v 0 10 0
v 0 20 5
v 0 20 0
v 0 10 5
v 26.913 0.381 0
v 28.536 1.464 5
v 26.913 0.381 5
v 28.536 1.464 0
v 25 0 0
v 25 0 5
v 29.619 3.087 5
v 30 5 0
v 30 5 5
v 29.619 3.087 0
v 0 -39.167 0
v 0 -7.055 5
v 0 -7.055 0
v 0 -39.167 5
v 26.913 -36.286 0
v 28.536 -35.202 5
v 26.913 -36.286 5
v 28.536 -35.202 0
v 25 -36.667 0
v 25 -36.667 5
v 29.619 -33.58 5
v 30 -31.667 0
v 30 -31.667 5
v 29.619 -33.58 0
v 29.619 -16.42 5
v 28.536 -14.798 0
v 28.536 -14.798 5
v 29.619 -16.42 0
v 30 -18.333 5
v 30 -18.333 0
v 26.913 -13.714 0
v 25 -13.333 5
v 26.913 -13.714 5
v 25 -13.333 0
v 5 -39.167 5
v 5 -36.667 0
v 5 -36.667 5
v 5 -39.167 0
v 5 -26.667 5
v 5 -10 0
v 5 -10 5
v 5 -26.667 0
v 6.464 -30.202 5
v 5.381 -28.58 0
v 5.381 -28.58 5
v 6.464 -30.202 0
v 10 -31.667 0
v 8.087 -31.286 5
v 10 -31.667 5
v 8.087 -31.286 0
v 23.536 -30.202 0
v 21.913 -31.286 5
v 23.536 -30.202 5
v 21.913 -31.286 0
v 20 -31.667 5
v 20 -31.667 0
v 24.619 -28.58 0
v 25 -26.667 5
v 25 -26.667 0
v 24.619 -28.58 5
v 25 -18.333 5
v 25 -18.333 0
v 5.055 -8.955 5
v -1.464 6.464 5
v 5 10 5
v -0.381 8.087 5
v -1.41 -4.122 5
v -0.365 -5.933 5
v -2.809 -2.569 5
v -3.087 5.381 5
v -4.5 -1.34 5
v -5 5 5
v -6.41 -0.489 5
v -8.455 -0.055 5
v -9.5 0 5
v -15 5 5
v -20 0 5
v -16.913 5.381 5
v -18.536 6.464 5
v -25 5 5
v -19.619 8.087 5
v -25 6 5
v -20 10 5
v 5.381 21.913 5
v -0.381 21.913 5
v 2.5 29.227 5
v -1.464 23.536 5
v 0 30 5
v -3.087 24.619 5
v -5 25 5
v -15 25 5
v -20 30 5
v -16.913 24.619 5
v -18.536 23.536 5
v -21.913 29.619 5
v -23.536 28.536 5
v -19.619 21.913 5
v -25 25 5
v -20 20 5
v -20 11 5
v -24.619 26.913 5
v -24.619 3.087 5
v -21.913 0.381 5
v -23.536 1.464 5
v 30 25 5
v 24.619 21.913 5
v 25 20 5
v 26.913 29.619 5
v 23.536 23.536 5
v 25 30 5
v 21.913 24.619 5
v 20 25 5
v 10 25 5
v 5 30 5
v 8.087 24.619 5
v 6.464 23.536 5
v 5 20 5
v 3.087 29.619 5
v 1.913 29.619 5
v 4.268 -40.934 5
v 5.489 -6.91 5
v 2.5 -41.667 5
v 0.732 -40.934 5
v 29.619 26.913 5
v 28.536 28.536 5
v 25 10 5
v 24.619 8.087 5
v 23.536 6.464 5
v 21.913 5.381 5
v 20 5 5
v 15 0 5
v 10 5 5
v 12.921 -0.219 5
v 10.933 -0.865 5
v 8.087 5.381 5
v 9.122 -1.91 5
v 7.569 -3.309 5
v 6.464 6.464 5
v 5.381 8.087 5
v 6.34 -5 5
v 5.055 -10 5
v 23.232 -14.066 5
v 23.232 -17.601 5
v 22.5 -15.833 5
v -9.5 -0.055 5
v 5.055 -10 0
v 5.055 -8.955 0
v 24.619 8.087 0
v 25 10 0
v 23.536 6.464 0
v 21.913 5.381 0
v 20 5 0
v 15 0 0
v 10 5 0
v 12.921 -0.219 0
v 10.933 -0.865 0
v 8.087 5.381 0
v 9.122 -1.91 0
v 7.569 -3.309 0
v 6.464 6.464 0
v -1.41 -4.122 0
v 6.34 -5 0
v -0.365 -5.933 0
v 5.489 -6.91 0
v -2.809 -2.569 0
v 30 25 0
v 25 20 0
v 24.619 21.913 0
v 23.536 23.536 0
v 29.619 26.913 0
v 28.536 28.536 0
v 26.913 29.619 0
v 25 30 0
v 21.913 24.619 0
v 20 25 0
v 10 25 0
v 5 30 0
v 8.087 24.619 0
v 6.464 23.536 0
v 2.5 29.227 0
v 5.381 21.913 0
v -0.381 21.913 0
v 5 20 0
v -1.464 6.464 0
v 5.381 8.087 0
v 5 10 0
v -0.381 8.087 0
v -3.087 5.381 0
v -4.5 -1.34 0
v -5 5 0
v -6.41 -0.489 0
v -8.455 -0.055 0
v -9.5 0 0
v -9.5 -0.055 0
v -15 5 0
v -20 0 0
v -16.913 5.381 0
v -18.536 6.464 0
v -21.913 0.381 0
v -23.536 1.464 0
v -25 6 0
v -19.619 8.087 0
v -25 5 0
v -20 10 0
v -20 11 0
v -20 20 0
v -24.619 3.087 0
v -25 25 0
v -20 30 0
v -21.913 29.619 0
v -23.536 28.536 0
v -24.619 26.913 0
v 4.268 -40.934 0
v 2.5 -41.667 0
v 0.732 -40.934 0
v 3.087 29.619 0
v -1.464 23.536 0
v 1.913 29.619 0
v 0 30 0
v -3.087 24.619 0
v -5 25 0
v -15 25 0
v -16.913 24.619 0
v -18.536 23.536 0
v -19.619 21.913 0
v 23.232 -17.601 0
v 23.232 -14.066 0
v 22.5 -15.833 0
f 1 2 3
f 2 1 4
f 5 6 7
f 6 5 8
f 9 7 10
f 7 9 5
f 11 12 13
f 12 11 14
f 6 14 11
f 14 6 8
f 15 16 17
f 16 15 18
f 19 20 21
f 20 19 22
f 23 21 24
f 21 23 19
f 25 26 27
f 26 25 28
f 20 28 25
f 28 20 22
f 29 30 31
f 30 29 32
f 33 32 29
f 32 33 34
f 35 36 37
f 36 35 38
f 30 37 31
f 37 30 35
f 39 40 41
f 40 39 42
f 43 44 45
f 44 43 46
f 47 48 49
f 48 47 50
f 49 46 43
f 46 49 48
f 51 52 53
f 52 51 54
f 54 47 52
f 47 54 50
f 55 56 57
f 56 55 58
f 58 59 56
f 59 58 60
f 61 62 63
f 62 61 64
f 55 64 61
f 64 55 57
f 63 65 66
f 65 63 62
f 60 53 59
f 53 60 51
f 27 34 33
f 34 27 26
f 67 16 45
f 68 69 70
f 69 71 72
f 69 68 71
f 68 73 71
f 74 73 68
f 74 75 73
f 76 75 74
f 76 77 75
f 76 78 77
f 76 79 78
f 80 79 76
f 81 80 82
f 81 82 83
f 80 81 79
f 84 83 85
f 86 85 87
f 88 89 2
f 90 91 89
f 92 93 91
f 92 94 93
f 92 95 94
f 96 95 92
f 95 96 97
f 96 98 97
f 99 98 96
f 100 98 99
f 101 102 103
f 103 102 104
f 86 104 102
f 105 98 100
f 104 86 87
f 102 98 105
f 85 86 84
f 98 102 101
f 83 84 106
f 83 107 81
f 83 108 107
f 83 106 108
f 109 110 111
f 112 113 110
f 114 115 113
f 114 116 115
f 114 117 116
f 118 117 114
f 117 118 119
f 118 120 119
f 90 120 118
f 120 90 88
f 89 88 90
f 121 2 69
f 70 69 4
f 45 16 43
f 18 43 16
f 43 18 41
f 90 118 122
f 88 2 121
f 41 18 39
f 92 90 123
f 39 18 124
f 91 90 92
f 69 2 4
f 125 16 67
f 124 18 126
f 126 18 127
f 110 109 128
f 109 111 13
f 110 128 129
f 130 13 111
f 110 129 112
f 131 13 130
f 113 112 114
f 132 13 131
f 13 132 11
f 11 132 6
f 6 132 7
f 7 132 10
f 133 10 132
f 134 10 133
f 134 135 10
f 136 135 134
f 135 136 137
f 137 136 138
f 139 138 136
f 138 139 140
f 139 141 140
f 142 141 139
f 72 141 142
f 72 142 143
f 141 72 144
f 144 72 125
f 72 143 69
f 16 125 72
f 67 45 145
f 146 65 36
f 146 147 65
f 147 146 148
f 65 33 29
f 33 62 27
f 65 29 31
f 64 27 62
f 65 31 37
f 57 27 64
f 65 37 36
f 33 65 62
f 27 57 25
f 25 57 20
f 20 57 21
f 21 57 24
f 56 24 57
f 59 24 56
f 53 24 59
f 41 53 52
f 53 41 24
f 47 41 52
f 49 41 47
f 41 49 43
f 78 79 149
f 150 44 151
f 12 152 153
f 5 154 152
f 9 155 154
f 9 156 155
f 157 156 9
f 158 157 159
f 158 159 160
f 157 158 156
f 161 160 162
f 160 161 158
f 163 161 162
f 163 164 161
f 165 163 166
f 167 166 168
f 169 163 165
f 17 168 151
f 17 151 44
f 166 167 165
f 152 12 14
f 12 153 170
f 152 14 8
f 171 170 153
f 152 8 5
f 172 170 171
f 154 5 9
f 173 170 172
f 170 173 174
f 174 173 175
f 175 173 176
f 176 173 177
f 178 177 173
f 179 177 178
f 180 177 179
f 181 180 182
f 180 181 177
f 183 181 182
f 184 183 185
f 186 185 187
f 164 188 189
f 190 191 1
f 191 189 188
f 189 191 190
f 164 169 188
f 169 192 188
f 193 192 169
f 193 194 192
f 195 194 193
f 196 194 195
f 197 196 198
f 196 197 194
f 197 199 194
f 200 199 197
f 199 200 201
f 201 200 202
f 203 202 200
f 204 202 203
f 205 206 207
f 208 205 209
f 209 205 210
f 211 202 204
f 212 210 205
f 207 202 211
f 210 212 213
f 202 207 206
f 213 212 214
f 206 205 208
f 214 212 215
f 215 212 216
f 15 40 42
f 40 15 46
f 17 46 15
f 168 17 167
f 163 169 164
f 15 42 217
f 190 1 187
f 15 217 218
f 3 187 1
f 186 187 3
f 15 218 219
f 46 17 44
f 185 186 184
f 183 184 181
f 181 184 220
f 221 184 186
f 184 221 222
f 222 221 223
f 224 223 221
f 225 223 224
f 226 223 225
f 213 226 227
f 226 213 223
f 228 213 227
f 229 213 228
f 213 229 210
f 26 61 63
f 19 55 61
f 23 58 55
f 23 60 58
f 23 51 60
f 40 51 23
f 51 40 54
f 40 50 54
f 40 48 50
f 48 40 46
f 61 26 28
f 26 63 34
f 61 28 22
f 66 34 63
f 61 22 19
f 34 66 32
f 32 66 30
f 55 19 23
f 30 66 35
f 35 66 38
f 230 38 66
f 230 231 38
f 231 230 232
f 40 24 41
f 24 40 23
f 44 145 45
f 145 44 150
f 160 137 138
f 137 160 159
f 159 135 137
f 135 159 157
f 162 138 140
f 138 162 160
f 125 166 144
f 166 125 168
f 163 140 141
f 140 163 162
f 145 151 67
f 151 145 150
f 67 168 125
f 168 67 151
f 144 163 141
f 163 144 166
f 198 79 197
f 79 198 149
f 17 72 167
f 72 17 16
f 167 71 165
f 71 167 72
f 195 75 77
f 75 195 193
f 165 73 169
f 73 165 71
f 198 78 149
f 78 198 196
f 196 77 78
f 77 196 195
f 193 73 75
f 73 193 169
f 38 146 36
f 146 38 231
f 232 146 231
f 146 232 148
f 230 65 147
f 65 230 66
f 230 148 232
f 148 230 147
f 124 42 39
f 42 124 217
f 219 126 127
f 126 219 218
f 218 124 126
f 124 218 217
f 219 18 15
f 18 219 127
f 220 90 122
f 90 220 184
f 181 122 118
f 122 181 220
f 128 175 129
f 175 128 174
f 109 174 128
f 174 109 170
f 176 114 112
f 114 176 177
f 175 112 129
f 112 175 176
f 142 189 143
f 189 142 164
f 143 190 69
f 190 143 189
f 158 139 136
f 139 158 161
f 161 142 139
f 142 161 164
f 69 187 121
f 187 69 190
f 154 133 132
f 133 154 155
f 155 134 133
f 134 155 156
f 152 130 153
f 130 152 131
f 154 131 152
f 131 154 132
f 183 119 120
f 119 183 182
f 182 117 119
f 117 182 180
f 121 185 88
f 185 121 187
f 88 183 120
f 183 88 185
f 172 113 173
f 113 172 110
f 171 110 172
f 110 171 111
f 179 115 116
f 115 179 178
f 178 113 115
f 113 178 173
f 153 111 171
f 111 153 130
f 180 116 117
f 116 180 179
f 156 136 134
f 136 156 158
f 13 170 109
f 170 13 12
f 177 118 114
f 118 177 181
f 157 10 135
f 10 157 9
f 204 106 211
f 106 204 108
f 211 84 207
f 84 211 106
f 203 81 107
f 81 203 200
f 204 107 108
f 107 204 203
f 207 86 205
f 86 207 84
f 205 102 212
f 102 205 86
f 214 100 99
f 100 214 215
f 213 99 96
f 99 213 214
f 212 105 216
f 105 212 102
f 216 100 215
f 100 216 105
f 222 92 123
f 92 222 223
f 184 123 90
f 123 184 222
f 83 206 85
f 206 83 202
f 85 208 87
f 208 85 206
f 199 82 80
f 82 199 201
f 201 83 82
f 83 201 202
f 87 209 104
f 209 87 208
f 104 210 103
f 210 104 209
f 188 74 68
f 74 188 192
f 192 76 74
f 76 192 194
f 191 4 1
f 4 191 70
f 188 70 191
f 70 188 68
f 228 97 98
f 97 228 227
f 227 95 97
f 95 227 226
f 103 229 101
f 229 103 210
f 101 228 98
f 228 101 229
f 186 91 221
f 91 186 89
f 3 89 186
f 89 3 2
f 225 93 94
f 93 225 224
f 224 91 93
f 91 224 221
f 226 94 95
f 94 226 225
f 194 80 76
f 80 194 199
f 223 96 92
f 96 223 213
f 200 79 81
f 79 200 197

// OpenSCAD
// Generated by SolidPython 0.4.7 on 2020-03-21 20:39:38


union() {
	translate(v = [0, -31.6666666667, 0]) {
		union() {
			difference() {
				translate(v = [0, -5, 0]) {
					difference() {
						cube(size = [30, 23.3333333333, 5]);
						rotate(a = [0, 0, 90]) {
							translate(v = [0, 0, -0.5000000000]) {
								difference() {
									cube(size = [6.0000000000, 6.0000000000, 7.0000000000]);
									translate(v = [0, 0, -0.5000000000]) {
										cylinder(h = 8, r = 5.0000000000);
									}
								}
							}
						}
						translate(v = [5.0000000000, 5.0000000000, 0]) {
							rotate(a = [0, 0, 180]) {
								translate(v = [0, 0, -0.5000000000]) {
									difference() {
										cube(size = [6.0000000000, 6.0000000000, 7.0000000000]);
										translate(v = [0, 0, -0.5000000000]) {
											cylinder(h = 8, r = 5.0000000000);
										}
									}
								}
							}
						}
						translate(v = [5.0000000000, 18.3333333333, 0]) {
							rotate(a = [0, 0, 90]) {
								translate(v = [0, 0, -0.5000000000]) {
									difference() {
										cube(size = [6.0000000000, 6.0000000000, 7.0000000000]);
										translate(v = [0, 0, -0.5000000000]) {
											cylinder(h = 8, r = 5.0000000000);
										}
									}
								}
							}
						}
						translate(v = [25.0000000000, 5.0000000000, 0]) {
							rotate(a = [0, 0, 270]) {
								translate(v = [0, 0, -0.5000000000]) {
									difference() {
										cube(size = [6.0000000000, 6.0000000000, 7.0000000000]);
										translate(v = [0, 0, -0.5000000000]) {
											cylinder(h = 8, r = 5.0000000000);
										}
									}
								}
							}
						}
						translate(v = [25.0000000000, 18.3333333333, 0]) {
							translate(v = [0, 0, -0.5000000000]) {
								difference() {
									cube(size = [6.0000000000, 6.0000000000, 7.0000000000]);
									translate(v = [0, 0, -0.5000000000]) {
										cylinder(h = 8, r = 5.0000000000);
									}
								}
							}
						}
						translate(v = [5, 5, -1]) {
							difference() {
								cube(size = [20, 13.3333333333, 7]);
								rotate(a = [0, 0, 90]) {
									translate(v = [0, 0, -0.5000000000]) {
										difference() {
											cube(size = [6.0000000000, 6.0000000000, 9.0000000000]);
											translate(v = [0, 0, -0.5000000000]) {
												cylinder(h = 10, r = 5.0000000000);
											}
										}
									}
								}
								translate(v = [5.0000000000, 5.0000000000, 0]) {
									rotate(a = [0, 0, 180]) {
										translate(v = [0, 0, -0.5000000000]) {
											difference() {
												cube(size = [6.0000000000, 6.0000000000, 9.0000000000]);
												translate(v = [0, 0, -0.5000000000]) {
													cylinder(h = 10, r = 5.0000000000);
												}
											}
										}
									}
								}
								translate(v = [5.0000000000, 8.3333333333, 0]) {
									rotate(a = [0, 0, 90]) {
										translate(v = [0, 0, -0.5000000000]) {
											difference() {
												cube(size = [6.0000000000, 6.0000000000, 9.0000000000]);
												translate(v = [0, 0, -0.5000000000]) {
													cylinder(h = 10, r = 5.0000000000);
												}
											}
										}
									}
								}
								translate(v = [15.0000000000, 5.0000000000, 0]) {
									rotate(a = [0, 0, 270]) {
										translate(v = [0, 0, -0.5000000000]) {
											difference() {
												cube(size = [6.0000000000, 6.0000000000, 9.0000000000]);
												translate(v = [0, 0, -0.5000000000]) {
													cylinder(h = 10, r = 5.0000000000);
												}
											}
										}
									}
								}
								translate(v = [15.0000000000, 8.3333333333, 0]) {
									translate(v = [0, 0, -0.5000000000]) {
										difference() {
											cube(size = [6.0000000000, 6.0000000000, 9.0000000000]);
											translate(v = [0, 0, -0.5000000000]) {
												cylinder(h = 10, r = 5.0000000000);
											}
										}
									}
								}
							}
						}
					}
				}
				translate(v = [5, 6.3333333333, -1]) {
					cube(size = [20, 17.3333333333, 7]);
				}
			}
			translate(v = [25, 15.8333333333, 0]) {
				cylinder(h = 5, r = 2.5000000000);
			}
			translate(v = [0, -7.5000000000, 0]) {
				cube(size = [5, 39.1666666667, 5]);
			}
			translate(v = [2.5000000000, -7.5000000000, 0]) {
				cylinder(h = 5, r = 2.5000000000);
			}
			translate(v = [15.0000000000, 21.6666666667, 0]) {
				rotate(a = [0, 0, 90]) {
					translate(v = [0, 0, 0]) {
						difference() {
							cube(size = [11.0000000000, 11.0000000000, 5]);
							translate(v = [0, 0, -0.5000000000]) {
								cylinder(h = 8, r = 10.0000000000);
							}
						}
					}
				}
			}
			translate(v = [-9.5000000000, 21.6666666667, 0]) {
				translate(v = [0, 0, 0]) {
					difference() {
						cube(size = [11.0000000000, 11.0000000000, 5]);
						translate(v = [0, 0, -0.5000000000]) {
							cylinder(h = 8, r = 10.0000000000);
						}
					}
				}
			}
		}
	}
	union() {
		difference() {
			cube(size = [30, 30, 5]);
			rotate(a = [0, 0, 90]) {
				translate(v = [0, 0, -0.5000000000]) {
					difference() {
						cube(size = [6.0000000000, 6.0000000000, 7.0000000000]);
						translate(v = [0, 0, -0.5000000000]) {
							cylinder(h = 8, r = 5.0000000000);
						}
					}
				}
			}
			translate(v = [5.0000000000, 5.0000000000, 0]) {
				rotate(a = [0, 0, 180]) {
					translate(v = [0, 0, -0.5000000000]) {
						difference() {
							cube(size = [6.0000000000, 6.0000000000, 7.0000000000]);
							translate(v = [0, 0, -0.5000000000]) {
								cylinder(h = 8, r = 5.0000000000);
							}
						}
					}
				}
			}
			translate(v = [5.0000000000, 25.0000000000, 0]) {
				rotate(a = [0, 0, 90]) {
					translate(v = [0, 0, -0.5000000000]) {
						difference() {
							cube(size = [6.0000000000, 6.0000000000, 7.0000000000]);
							translate(v = [0, 0, -0.5000000000]) {
								cylinder(h = 8, r = 5.0000000000);
							}
						}
					}
				}
			}
			translate(v = [25.0000000000, 5.0000000000, 0]) {
				rotate(a = [0, 0, 270]) {
					translate(v = [0, 0, -0.5000000000]) {
						difference() {
							cube(size = [6.0000000000, 6.0000000000, 7.0000000000]);
							translate(v = [0, 0, -0.5000000000]) {
								cylinder(h = 8, r = 5.0000000000);
							}
						}
					}
				}
			}
			translate(v = [25.0000000000, 25.0000000000, 0]) {
				translate(v = [0, 0, -0.5000000000]) {
					difference() {
						cube(size = [6.0000000000, 6.0000000000, 7.0000000000]);
						translate(v = [0, 0, -0.5000000000]) {
							cylinder(h = 8, r = 5.0000000000);
						}
					}
				}
			}
			translate(v = [5, 5, -1]) {
				difference() {
					cube(size = [20, 20, 7]);
					rotate(a = [0, 0, 90]) {
						translate(v = [0, 0, -0.5000000000]) {
							difference() {
								cube(size = [6.0000000000, 6.0000000000, 9.0000000000]);
								translate(v = [0, 0, -0.5000000000]) {
									cylinder(h = 10, r = 5.0000000000);
								}
							}
						}
					}
					translate(v = [5.0000000000, 5.0000000000, 0]) {
						rotate(a = [0, 0, 180]) {
							translate(v = [0, 0, -0.5000000000]) {
								difference() {
									cube(size = [6.0000000000, 6.0000000000, 9.0000000000]);
									translate(v = [0, 0, -0.5000000000]) {
										cylinder(h = 10, r = 5.0000000000);
									}
								}
							}
						}
					}
					translate(v = [5.0000000000, 15.0000000000, 0]) {
						rotate(a = [0, 0, 90]) {
							translate(v = [0, 0, -0.5000000000]) {
								difference() {
									cube(size = [6.0000000000, 6.0000000000, 9.0000000000]);
									translate(v = [0, 0, -0.5000000000]) {
										cylinder(h = 10, r = 5.0000000000);
									}
								}
							}
						}
					}
					translate(v = [15.0000000000, 5.0000000000, 0]) {
						rotate(a = [0, 0, 270]) {
							translate(v = [0, 0, -0.5000000000]) {
								difference() {
									cube(size = [6.0000000000, 6.0000000000, 9.0000000000]);
									translate(v = [0, 0, -0.5000000000]) {
										cylinder(h = 10, r = 5.0000000000);
									}
								}
							}
						}
					}
					translate(v = [15.0000000000, 15.0000000000, 0]) {
						translate(v = [0, 0, -0.5000000000]) {
							difference() {
								cube(size = [6.0000000000, 6.0000000000, 9.0000000000]);
								translate(v = [0, 0, -0.5000000000]) {
									cylinder(h = 10, r = 5.0000000000);
								}
							}
						}
					}
				}
			}
		}
		translate(v = [-25, 0, 0]) {
			difference() {
				cube(size = [30, 30, 5]);
				rotate(a = [0, 0, 90]) {
					translate(v = [0, 0, -0.5000000000]) {
						difference() {
							cube(size = [6.0000000000, 6.0000000000, 7.0000000000]);
							translate(v = [0, 0, -0.5000000000]) {
								cylinder(h = 8, r = 5.0000000000);
							}
						}
					}
				}
				translate(v = [5.0000000000, 5.0000000000, 0]) {
					rotate(a = [0, 0, 180]) {
						translate(v = [0, 0, -0.5000000000]) {
							difference() {
								cube(size = [6.0000000000, 6.0000000000, 7.0000000000]);
								translate(v = [0, 0, -0.5000000000]) {
									cylinder(h = 8, r = 5.0000000000);
								}
							}
						}
					}
				}
				translate(v = [5.0000000000, 25.0000000000, 0]) {
					rotate(a = [0, 0, 90]) {
						translate(v = [0, 0, -0.5000000000]) {
							difference() {
								cube(size = [6.0000000000, 6.0000000000, 7.0000000000]);
								translate(v = [0, 0, -0.5000000000]) {
									cylinder(h = 8, r = 5.0000000000);
								}
							}
						}
					}
				}
				translate(v = [25.0000000000, 5.0000000000, 0]) {
					rotate(a = [0, 0, 270]) {
						translate(v = [0, 0, -0.5000000000]) {
							difference() {
								cube(size = [6.0000000000, 6.0000000000, 7.0000000000]);
								translate(v = [0, 0, -0.5000000000]) {
									cylinder(h = 8, r = 5.0000000000);
								}
							}
						}
					}
				}
				translate(v = [25.0000000000, 25.0000000000, 0]) {
					translate(v = [0, 0, -0.5000000000]) {
						difference() {
							cube(size = [6.0000000000, 6.0000000000, 7.0000000000]);
							translate(v = [0, 0, -0.5000000000]) {
								cylinder(h = 8, r = 5.0000000000);
							}
						}
					}
				}
				translate(v = [5, 5, -1]) {
					difference() {
						cube(size = [20, 20, 7]);
						rotate(a = [0, 0, 90]) {
							translate(v = [0, 0, -0.5000000000]) {
								difference() {
									cube(size = [6.0000000000, 6.0000000000, 9.0000000000]);
									translate(v = [0, 0, -0.5000000000]) {
										cylinder(h = 10, r = 5.0000000000);
									}
								}
							}
						}
						translate(v = [5.0000000000, 5.0000000000, 0]) {
							rotate(a = [0, 0, 180]) {
								translate(v = [0, 0, -0.5000000000]) {
									difference() {
										cube(size = [6.0000000000, 6.0000000000, 9.0000000000]);
										translate(v = [0, 0, -0.5000000000]) {
											cylinder(h = 10, r = 5.0000000000);
										}
									}
								}
							}
						}
						translate(v = [5.0000000000, 15.0000000000, 0]) {
							rotate(a = [0, 0, 90]) {
								translate(v = [0, 0, -0.5000000000]) {
									difference() {
										cube(size = [6.0000000000, 6.0000000000, 9.0000000000]);
										translate(v = [0, 0, -0.5000000000]) {
											cylinder(h = 10, r = 5.0000000000);
										}
									}
								}
							}
						}
						translate(v = [15.0000000000, 5.0000000000, 0]) {
							rotate(a = [0, 0, 270]) {
								translate(v = [0, 0, -0.5000000000]) {
									difference() {
										cube(size = [6.0000000000, 6.0000000000, 9.0000000000]);
										translate(v = [0, 0, -0.5000000000]) {
											cylinder(h = 10, r = 5.0000000000);
										}
									}
								}
							}
						}
						translate(v = [15.0000000000, 15.0000000000, 0]) {
							translate(v = [0, 0, -0.5000000000]) {
								difference() {
									cube(size = [6.0000000000, 6.0000000000, 9.0000000000]);
									translate(v = [0, 0, -0.5000000000]) {
										cylinder(h = 10, r = 5.0000000000);
									}
								}
							}
						}
					}
				}
			}
		}
	}
	translate(v = [0, -5, 0]) {
		cube(size = [5, 10, 5]);
	}
}
/***********************************************
*********      SolidPython code:      **********
************************************************
 
from solid import *

# Units are mm

def rounder(height, radius, tolerance=0.5):
    # Adding 1 mm extra padding to ensure proper sustraction
    res = cube([radius+1, radius+1, height+tolerance*4])-\
          translate([0, 0, -0.5])(cylinder(r=radius, h=height+3))
    res = translate([0, 0, -tolerance])(res)
    return res

def round_cube(width, length, height, radius):
    res = cube([width, length, height])-rotate([0, 0, 90])(rounder(height, radius))
    corner1 = translate([radius, radius, 0])(rotate([0, 0, 180])(rounder(height, radius)))
    corner2 = translate([radius, length-radius, 0])(rotate([0, 0, 90])(rounder(height, radius)))
    corner3 = translate([width-radius, radius, 0])(rotate([0, 0, 270])(rounder(height, radius)))
    corner4 = translate([width-radius, length-radius, 0])(rounder(height, radius))
    return res-corner1-corner2-corner3-corner4

def hollow_round_cube(width, length, height, radius, girth):
    res = round_cube(width + girth * 2, length + girth * 2, height, radius)
    hole = translate([girth, girth, -1])(round_cube(width, length, height + 2, radius))
    return res - hole

def double_hollow_round_cube(width, length, height, radius, girth):
    first = hollow_round_cube(width, length, height, radius, girth)
    second = translate([-width - girth, 0, 0])\
            (hollow_round_cube(width, length, height, radius, girth))
    return first + second

def hook(width, length, height, radius, girth, finger_length):
    res = translate([0, -girth, 0])(hollow_round_cube(width, length, height, radius, girth))
    inn = translate([girth, length-girth-2, -1])(cube([width, length + 4, height + 2]))
    tip = translate([width+girth, length+girth/2, 0])(cylinder(r=girth/2, h=height))
    joint = rounder(height, radius*2, 0)
    join1 = translate([radius*2+girth, length-radius*2+girth+finger_length, 0])\
            (rotate([0, 0, 90])(joint))
    join2 = translate([- width + girth+2+radius/2 + 1, length-radius * 2+girth+finger_length, 0])\
            (joint)
    finger = translate([0, -girth*1.5, 0])\
            (cube([girth, finger_length + girth * 2.5 + length, girth]))
    fingertip = translate([girth/2, -girth*1.5, 0])(cylinder(r=girth / 2, h=height))
    return translate([0, -length-girth-finger_length, 0])\
            (res-inn+tip+finger+fingertip+join1+join2)


def tool(width, length, height, radius, girth, finger_length, hook_length):
    handler = double_hollow_round_cube(width, length, height, radius, girth)
    h = hook(width, hook_length, height, radius, girth, finger_length)
    joint = translate([0, -girth, 0])(cube([girth, girth*2, height]))
    return h+handler+joint


hole_width = 20
hole_length = hole_width
hook_length = hole_width/1.5
finger_length = hole_width/1.5
girth = 5
height = girth
radius = hole_width/4

res = tool(hole_width, hole_length, height, radius, girth, finger_length, hook_length)

print("Saving openscad file...")
scad_render_to_file(res, "grab_hook.scad") 
 
************************************************/
